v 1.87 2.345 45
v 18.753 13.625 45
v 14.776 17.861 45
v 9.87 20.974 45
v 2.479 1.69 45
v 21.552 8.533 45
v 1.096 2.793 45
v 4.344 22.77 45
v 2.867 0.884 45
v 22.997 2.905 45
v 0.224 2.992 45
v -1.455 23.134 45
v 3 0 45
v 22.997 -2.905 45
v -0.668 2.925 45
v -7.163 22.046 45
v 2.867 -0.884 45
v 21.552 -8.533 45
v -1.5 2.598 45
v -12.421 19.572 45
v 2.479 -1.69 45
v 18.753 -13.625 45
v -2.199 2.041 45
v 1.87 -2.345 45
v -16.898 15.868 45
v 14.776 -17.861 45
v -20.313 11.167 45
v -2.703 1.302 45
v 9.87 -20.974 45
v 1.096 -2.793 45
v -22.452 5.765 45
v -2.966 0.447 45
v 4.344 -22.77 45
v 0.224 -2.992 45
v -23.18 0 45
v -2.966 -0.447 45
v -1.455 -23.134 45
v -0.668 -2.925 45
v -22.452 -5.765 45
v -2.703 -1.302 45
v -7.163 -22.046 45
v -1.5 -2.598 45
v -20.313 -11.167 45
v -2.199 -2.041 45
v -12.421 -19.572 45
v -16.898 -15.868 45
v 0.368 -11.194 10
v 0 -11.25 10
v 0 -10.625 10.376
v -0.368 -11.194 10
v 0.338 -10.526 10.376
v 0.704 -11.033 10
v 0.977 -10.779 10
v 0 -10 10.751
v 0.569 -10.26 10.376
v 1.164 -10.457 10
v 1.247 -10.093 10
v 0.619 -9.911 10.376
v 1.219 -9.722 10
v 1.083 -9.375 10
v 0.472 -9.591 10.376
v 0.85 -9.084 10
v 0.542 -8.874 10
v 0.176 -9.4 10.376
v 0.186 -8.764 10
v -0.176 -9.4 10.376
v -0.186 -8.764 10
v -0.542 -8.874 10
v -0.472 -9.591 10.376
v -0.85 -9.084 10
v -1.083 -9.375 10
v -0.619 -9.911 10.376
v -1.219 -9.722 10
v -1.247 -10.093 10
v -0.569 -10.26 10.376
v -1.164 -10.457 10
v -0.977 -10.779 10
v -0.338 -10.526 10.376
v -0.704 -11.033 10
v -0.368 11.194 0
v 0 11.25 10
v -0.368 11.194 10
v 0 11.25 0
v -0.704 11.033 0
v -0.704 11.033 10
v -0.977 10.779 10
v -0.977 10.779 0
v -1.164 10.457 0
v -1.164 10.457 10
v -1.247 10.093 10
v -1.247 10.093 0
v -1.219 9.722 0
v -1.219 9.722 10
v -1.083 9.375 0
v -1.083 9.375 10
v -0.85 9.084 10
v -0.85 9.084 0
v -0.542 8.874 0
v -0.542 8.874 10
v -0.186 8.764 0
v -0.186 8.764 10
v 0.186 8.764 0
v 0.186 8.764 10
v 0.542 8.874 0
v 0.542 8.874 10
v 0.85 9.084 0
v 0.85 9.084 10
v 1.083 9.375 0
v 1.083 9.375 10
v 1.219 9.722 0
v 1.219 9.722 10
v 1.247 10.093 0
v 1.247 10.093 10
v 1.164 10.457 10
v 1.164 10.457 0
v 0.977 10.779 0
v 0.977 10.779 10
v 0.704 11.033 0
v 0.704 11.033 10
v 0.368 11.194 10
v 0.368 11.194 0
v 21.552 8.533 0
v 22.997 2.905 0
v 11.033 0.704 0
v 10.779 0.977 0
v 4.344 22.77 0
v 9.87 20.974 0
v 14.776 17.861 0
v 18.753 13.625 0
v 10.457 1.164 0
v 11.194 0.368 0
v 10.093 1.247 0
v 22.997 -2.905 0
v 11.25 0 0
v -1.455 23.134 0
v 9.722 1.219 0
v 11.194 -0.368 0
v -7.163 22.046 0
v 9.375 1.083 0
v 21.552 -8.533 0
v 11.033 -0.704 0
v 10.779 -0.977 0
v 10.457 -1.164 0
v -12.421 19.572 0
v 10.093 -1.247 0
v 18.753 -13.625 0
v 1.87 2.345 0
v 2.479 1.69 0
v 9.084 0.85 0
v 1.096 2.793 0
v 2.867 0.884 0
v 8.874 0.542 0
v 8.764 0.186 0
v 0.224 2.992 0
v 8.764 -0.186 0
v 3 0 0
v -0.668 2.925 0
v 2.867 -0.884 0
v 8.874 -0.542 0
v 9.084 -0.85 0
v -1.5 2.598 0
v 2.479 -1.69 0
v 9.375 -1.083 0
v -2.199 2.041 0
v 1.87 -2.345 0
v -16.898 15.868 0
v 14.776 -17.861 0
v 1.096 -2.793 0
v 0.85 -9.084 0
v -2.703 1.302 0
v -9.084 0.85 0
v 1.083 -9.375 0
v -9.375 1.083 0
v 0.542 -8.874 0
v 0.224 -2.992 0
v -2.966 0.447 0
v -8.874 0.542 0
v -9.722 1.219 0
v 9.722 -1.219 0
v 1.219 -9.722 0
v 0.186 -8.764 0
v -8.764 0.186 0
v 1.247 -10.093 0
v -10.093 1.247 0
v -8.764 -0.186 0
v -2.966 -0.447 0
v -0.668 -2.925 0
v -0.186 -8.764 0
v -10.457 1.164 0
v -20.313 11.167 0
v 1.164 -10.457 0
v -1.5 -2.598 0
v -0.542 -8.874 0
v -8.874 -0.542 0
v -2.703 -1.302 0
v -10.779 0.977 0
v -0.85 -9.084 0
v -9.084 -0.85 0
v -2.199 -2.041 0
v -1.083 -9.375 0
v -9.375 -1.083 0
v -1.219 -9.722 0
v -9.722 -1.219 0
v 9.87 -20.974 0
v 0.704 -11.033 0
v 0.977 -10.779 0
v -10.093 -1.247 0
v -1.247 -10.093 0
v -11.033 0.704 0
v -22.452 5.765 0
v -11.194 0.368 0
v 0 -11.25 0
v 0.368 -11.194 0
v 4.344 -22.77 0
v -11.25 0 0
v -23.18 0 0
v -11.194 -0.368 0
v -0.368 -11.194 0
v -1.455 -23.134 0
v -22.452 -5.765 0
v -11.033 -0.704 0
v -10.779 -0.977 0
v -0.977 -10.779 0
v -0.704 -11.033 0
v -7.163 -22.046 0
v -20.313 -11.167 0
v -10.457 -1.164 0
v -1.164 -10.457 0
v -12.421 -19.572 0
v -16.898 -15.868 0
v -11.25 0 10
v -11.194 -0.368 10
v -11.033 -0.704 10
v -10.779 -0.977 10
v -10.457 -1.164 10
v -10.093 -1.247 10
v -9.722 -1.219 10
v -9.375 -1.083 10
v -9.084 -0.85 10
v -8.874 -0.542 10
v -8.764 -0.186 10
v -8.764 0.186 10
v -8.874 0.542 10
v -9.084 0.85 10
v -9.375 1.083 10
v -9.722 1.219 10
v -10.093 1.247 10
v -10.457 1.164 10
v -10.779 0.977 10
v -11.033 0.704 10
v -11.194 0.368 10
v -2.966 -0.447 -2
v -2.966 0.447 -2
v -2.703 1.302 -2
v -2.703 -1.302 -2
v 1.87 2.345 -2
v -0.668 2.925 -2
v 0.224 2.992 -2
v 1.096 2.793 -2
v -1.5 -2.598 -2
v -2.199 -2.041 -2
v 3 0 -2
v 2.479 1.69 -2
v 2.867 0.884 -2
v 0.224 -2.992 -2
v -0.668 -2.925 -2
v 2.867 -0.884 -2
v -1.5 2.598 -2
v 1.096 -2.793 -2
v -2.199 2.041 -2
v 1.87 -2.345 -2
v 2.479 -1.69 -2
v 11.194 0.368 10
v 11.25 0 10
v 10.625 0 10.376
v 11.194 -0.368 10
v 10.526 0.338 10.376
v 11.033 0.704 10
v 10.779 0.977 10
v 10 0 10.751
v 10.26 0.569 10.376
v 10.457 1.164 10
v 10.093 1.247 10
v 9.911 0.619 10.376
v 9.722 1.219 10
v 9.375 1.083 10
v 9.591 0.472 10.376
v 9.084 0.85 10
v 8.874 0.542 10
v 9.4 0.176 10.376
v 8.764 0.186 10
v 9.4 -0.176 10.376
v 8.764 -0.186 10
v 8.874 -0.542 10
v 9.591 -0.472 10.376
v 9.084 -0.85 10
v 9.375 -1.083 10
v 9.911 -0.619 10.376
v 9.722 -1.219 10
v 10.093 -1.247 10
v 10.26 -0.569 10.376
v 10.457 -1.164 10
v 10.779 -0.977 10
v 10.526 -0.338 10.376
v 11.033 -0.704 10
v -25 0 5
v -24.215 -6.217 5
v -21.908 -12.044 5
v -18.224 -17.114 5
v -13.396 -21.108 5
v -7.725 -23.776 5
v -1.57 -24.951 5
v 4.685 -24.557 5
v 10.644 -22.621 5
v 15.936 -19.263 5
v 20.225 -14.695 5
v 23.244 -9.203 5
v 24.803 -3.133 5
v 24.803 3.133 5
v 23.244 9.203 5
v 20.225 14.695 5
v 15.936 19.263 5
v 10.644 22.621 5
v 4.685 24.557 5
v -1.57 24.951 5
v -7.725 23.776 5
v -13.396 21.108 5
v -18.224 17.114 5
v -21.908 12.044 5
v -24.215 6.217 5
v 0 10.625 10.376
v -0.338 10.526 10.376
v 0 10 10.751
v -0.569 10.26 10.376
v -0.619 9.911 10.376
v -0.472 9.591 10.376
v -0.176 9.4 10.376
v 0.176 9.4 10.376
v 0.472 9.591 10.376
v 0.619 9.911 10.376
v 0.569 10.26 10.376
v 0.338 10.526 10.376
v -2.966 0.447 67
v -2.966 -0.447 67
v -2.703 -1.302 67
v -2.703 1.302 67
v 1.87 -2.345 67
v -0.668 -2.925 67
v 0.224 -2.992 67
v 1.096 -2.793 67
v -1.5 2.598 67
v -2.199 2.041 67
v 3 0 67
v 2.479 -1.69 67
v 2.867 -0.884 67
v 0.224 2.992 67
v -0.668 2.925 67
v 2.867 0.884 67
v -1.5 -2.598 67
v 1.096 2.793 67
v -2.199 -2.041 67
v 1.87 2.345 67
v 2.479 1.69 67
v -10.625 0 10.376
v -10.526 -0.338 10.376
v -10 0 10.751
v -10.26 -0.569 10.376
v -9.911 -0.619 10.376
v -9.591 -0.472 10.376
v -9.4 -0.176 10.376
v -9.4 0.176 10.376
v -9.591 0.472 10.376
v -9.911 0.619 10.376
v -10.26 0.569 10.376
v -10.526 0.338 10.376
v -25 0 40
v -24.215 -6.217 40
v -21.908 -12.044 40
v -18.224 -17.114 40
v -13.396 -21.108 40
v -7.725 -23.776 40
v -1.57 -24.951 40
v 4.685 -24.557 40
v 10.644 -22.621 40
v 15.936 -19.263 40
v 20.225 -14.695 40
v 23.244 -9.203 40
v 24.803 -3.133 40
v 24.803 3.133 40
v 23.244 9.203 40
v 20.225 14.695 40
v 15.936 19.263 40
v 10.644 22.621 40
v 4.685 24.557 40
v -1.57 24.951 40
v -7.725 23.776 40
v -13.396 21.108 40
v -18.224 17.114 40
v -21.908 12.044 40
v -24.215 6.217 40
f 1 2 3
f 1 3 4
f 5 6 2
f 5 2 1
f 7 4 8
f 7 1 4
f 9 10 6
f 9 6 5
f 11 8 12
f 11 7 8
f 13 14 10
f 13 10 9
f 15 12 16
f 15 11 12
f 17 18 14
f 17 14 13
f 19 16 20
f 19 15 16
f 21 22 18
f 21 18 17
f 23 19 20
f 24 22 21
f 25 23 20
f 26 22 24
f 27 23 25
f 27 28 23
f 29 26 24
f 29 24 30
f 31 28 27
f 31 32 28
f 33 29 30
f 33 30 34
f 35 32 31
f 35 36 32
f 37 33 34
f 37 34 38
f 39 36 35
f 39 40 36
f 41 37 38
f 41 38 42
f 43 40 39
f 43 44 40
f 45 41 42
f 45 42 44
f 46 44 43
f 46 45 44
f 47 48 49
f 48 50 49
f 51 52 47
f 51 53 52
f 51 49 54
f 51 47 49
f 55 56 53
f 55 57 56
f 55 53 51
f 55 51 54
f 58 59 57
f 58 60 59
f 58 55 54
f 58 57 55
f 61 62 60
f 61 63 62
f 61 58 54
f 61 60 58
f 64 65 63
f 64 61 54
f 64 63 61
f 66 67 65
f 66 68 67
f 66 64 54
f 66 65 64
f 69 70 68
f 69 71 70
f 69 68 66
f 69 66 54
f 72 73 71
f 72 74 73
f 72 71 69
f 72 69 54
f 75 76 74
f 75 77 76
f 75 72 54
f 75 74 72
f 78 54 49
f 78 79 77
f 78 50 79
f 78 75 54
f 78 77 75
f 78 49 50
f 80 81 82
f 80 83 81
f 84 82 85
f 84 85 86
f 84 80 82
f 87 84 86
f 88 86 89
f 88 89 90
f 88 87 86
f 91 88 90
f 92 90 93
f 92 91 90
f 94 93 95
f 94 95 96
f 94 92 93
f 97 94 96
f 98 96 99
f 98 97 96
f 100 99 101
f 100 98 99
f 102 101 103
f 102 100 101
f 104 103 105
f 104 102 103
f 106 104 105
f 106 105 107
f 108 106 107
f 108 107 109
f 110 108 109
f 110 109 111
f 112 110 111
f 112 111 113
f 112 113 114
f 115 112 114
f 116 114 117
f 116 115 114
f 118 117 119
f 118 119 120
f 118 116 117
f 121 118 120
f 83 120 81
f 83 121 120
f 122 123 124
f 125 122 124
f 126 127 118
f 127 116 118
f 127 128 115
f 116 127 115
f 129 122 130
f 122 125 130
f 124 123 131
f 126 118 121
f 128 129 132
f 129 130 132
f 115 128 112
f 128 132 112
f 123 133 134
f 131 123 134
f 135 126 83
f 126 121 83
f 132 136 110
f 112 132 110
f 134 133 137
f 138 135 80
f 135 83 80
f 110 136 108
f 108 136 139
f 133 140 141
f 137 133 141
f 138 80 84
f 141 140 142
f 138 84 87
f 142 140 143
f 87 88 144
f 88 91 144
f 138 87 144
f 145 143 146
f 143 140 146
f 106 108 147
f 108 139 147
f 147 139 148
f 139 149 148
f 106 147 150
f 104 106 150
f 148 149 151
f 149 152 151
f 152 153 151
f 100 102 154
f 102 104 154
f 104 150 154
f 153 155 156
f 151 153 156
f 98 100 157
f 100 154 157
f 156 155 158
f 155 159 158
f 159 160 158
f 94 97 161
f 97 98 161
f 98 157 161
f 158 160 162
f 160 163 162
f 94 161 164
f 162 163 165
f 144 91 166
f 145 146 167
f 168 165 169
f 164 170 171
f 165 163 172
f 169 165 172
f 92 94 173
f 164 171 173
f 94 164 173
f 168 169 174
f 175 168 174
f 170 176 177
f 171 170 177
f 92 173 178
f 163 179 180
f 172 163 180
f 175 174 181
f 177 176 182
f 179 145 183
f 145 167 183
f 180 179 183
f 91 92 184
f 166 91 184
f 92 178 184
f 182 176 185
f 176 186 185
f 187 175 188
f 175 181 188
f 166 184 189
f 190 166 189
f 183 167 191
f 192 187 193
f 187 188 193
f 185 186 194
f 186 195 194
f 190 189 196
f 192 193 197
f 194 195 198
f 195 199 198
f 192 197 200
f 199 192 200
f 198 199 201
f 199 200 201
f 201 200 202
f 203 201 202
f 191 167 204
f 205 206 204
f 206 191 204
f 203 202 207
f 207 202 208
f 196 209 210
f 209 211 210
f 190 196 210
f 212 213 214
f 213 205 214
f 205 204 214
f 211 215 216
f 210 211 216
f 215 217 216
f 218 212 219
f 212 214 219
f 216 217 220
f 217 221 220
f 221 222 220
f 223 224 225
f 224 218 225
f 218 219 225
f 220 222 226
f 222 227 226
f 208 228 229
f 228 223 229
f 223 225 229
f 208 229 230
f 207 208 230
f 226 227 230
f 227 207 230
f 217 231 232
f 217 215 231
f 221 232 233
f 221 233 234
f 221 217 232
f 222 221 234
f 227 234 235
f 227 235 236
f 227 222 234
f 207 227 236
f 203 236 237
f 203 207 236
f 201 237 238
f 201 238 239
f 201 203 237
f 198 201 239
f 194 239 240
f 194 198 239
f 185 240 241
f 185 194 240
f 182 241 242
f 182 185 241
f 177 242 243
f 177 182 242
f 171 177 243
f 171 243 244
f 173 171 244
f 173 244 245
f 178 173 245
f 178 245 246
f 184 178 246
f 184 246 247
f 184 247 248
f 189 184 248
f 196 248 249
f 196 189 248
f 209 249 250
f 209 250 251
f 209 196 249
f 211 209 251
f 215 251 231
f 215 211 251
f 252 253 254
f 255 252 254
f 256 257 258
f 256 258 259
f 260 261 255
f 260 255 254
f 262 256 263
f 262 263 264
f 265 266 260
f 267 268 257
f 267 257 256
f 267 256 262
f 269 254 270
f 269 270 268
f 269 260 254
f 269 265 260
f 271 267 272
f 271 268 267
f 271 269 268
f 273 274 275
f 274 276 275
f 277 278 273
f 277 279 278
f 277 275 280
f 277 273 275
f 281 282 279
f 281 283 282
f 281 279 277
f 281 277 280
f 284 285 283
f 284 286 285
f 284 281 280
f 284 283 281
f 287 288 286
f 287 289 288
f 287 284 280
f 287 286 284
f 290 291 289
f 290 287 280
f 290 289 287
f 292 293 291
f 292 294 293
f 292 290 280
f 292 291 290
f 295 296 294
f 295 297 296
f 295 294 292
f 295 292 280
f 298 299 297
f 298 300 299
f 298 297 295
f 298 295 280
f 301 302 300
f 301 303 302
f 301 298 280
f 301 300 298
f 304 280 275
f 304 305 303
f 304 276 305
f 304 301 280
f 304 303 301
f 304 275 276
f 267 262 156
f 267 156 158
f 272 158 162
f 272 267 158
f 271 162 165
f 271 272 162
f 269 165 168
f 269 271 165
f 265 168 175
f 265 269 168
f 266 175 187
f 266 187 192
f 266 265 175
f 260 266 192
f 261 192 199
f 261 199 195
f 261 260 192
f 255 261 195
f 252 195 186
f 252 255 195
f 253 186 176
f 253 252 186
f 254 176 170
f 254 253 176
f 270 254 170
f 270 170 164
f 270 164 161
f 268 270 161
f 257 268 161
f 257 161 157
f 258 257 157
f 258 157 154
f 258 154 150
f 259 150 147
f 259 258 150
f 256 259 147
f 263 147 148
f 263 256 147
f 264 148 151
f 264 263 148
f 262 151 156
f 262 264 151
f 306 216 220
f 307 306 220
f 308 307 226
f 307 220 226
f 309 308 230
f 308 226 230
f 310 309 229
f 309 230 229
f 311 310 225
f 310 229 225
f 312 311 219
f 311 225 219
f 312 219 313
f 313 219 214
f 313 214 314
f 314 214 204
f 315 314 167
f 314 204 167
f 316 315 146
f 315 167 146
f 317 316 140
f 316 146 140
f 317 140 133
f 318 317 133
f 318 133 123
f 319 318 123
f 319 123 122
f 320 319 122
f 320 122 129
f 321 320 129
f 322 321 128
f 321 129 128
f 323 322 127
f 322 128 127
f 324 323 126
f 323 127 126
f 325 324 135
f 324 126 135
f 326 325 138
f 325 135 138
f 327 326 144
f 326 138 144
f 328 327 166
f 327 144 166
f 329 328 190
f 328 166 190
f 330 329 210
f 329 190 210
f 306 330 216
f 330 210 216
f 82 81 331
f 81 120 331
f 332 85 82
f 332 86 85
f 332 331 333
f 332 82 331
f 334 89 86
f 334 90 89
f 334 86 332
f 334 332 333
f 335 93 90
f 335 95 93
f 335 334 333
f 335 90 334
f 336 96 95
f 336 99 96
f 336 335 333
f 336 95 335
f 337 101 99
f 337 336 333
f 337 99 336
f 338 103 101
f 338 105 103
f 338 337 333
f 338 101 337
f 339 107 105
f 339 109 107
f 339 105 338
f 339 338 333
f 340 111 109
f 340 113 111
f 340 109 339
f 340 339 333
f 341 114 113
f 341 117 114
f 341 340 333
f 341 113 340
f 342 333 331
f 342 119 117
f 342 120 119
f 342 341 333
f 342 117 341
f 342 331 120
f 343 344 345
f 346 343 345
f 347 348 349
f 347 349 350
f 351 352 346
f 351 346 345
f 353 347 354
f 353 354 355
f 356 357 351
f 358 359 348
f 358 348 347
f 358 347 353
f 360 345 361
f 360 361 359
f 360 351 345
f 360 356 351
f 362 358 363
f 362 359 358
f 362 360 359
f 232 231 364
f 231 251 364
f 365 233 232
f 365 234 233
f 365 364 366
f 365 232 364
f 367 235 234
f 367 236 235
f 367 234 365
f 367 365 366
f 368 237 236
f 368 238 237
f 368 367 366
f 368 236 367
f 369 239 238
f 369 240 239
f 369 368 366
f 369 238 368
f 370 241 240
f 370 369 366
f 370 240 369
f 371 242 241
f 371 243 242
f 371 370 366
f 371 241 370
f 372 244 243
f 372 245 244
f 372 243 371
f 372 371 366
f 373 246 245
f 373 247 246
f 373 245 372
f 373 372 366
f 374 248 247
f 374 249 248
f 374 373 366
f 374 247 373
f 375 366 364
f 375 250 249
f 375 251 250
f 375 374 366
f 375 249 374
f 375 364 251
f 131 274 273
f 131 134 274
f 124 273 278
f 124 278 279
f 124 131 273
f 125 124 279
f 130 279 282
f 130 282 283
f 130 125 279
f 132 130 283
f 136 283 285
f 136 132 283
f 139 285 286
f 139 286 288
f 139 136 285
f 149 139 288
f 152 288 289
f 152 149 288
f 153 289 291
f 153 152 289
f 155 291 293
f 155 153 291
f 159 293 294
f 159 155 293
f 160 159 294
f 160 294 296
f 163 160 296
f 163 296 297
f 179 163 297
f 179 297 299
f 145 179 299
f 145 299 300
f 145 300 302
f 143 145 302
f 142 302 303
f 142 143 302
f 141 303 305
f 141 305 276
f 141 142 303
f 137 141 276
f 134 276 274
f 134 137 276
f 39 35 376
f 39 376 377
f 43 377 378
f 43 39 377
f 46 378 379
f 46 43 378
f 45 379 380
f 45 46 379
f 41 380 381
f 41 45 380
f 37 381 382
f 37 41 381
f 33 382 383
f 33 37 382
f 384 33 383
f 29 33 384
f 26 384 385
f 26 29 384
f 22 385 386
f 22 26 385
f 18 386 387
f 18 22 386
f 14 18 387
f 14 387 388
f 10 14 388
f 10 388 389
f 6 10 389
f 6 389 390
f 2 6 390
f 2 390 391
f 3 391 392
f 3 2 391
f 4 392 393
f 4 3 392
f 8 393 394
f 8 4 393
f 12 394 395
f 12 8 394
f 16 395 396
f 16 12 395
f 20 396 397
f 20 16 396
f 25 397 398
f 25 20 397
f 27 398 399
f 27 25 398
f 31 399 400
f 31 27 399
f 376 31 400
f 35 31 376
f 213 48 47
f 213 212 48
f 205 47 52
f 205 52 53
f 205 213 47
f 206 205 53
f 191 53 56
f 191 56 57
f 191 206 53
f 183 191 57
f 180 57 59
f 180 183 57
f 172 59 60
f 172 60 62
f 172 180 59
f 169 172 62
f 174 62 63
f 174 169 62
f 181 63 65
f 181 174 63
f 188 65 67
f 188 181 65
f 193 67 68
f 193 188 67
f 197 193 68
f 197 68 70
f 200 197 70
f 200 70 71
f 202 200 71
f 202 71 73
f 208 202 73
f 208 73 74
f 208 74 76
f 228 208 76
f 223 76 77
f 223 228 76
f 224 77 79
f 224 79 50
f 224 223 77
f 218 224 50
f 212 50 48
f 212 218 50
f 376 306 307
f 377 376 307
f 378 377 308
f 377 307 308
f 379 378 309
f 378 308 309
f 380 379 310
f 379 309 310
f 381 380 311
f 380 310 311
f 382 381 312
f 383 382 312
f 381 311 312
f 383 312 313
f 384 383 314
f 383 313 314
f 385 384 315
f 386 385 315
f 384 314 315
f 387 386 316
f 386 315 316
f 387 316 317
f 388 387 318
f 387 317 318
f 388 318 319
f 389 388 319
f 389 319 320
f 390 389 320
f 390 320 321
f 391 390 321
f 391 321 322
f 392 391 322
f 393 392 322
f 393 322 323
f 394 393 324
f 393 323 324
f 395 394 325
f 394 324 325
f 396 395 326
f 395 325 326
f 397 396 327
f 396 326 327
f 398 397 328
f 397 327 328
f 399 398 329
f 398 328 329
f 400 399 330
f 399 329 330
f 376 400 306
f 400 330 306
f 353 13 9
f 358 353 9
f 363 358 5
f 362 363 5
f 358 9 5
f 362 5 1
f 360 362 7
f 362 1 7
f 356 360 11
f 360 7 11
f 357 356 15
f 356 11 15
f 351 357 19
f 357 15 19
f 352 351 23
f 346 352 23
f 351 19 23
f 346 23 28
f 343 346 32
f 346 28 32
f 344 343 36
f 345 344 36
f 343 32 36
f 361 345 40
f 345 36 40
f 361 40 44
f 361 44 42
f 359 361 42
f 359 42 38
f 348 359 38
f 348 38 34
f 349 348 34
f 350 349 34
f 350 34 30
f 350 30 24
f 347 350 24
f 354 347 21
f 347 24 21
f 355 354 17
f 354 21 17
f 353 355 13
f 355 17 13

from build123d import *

# Parameters (mm, degrees)
SKETCH1_R           = 25
BOSS_EXTRUDE1_DEPTH = 45
CHAMFER1_SIZE       = 5
CHAMFER1_SIZE2      = 1.819851171
SKETCH2_R           = 3
BOSS_EXTRUDE2_DEPTH = 22
BOSS_EXTRUDE3_START = 2
SKETCH3_R           = 3
BOSS_EXTRUDE3_DEPTH = 2
CIRPATTERN1_COUNT   = 4


with BuildPart() as part:
    # Sketch1 → Boss-Extrude1 (new body)
    with BuildSketch(Plane.XY):
        with Locations(Location((0, 0, 0), (0, 0, 180))):
            Circle(SKETCH1_R)
    extrude(amount=BOSS_EXTRUDE1_DEPTH)

    # Chamfer1
    chamfer1_edges = [part.edges().sort_by_distance(p)[0] for p in [
        (25, 0, 0),
        (25, 0, 45),
    ]]
    chamfer1_side = [part.faces().sort_by_distance(p)[0] for p in [
        (25, 0, 22.5),
    ]]
    chamfer(chamfer1_edges, length=CHAMFER1_SIZE, length2=CHAMFER1_SIZE2, reference=chamfer1_side[0])

    # Sketch2 → Boss-Extrude2 (add)
    with BuildSketch(Plane.XY.offset(45)):
        Circle(SKETCH2_R)
    extrude(amount=BOSS_EXTRUDE2_DEPTH)

    # Sketch3 → Boss-Extrude3 (add)
    with BuildSketch(Plane(origin=(0, 0, 0), x_dir=(-1, 0, 0), z_dir=(0, 0, -1)).offset(BOSS_EXTRUDE3_START)):
        with Locations(Location((0, 0, 0), (0, 0, 180))):
            Circle(SKETCH3_R)
    extrude(amount=-BOSS_EXTRUDE3_DEPTH)

    # Sketch5 → Tap Drill for M3x0.5 Tap1 (revolve, cut)
    with BuildSketch(Plane(origin=(0, 10, 0), x_dir=(0, 1, 0), z_dir=(1, 0, 0))):
        Polygon((0, 0), (0, 10.751075774), (1.25, 10), (1.25, 0), align=None)
    tap_drill_for_m3x0_5_tap1 = revolve(axis=Axis((0, 10, -6.35), (0, 0, 1)), mode=Mode.SUBTRACT)

    # CirPattern1: Tap Drill for M3x0.5 Tap1 ×4 about axis
    cirpattern1_axis = Axis((0, 0, 0), (0, 0, 1))
    for i in range(1, CIRPATTERN1_COUNT):
        add(tap_drill_for_m3x0_5_tap1.rotate(cirpattern1_axis, i * 360 / CIRPATTERN1_COUNT), mode=Mode.SUBTRACT)


solid = part.part
